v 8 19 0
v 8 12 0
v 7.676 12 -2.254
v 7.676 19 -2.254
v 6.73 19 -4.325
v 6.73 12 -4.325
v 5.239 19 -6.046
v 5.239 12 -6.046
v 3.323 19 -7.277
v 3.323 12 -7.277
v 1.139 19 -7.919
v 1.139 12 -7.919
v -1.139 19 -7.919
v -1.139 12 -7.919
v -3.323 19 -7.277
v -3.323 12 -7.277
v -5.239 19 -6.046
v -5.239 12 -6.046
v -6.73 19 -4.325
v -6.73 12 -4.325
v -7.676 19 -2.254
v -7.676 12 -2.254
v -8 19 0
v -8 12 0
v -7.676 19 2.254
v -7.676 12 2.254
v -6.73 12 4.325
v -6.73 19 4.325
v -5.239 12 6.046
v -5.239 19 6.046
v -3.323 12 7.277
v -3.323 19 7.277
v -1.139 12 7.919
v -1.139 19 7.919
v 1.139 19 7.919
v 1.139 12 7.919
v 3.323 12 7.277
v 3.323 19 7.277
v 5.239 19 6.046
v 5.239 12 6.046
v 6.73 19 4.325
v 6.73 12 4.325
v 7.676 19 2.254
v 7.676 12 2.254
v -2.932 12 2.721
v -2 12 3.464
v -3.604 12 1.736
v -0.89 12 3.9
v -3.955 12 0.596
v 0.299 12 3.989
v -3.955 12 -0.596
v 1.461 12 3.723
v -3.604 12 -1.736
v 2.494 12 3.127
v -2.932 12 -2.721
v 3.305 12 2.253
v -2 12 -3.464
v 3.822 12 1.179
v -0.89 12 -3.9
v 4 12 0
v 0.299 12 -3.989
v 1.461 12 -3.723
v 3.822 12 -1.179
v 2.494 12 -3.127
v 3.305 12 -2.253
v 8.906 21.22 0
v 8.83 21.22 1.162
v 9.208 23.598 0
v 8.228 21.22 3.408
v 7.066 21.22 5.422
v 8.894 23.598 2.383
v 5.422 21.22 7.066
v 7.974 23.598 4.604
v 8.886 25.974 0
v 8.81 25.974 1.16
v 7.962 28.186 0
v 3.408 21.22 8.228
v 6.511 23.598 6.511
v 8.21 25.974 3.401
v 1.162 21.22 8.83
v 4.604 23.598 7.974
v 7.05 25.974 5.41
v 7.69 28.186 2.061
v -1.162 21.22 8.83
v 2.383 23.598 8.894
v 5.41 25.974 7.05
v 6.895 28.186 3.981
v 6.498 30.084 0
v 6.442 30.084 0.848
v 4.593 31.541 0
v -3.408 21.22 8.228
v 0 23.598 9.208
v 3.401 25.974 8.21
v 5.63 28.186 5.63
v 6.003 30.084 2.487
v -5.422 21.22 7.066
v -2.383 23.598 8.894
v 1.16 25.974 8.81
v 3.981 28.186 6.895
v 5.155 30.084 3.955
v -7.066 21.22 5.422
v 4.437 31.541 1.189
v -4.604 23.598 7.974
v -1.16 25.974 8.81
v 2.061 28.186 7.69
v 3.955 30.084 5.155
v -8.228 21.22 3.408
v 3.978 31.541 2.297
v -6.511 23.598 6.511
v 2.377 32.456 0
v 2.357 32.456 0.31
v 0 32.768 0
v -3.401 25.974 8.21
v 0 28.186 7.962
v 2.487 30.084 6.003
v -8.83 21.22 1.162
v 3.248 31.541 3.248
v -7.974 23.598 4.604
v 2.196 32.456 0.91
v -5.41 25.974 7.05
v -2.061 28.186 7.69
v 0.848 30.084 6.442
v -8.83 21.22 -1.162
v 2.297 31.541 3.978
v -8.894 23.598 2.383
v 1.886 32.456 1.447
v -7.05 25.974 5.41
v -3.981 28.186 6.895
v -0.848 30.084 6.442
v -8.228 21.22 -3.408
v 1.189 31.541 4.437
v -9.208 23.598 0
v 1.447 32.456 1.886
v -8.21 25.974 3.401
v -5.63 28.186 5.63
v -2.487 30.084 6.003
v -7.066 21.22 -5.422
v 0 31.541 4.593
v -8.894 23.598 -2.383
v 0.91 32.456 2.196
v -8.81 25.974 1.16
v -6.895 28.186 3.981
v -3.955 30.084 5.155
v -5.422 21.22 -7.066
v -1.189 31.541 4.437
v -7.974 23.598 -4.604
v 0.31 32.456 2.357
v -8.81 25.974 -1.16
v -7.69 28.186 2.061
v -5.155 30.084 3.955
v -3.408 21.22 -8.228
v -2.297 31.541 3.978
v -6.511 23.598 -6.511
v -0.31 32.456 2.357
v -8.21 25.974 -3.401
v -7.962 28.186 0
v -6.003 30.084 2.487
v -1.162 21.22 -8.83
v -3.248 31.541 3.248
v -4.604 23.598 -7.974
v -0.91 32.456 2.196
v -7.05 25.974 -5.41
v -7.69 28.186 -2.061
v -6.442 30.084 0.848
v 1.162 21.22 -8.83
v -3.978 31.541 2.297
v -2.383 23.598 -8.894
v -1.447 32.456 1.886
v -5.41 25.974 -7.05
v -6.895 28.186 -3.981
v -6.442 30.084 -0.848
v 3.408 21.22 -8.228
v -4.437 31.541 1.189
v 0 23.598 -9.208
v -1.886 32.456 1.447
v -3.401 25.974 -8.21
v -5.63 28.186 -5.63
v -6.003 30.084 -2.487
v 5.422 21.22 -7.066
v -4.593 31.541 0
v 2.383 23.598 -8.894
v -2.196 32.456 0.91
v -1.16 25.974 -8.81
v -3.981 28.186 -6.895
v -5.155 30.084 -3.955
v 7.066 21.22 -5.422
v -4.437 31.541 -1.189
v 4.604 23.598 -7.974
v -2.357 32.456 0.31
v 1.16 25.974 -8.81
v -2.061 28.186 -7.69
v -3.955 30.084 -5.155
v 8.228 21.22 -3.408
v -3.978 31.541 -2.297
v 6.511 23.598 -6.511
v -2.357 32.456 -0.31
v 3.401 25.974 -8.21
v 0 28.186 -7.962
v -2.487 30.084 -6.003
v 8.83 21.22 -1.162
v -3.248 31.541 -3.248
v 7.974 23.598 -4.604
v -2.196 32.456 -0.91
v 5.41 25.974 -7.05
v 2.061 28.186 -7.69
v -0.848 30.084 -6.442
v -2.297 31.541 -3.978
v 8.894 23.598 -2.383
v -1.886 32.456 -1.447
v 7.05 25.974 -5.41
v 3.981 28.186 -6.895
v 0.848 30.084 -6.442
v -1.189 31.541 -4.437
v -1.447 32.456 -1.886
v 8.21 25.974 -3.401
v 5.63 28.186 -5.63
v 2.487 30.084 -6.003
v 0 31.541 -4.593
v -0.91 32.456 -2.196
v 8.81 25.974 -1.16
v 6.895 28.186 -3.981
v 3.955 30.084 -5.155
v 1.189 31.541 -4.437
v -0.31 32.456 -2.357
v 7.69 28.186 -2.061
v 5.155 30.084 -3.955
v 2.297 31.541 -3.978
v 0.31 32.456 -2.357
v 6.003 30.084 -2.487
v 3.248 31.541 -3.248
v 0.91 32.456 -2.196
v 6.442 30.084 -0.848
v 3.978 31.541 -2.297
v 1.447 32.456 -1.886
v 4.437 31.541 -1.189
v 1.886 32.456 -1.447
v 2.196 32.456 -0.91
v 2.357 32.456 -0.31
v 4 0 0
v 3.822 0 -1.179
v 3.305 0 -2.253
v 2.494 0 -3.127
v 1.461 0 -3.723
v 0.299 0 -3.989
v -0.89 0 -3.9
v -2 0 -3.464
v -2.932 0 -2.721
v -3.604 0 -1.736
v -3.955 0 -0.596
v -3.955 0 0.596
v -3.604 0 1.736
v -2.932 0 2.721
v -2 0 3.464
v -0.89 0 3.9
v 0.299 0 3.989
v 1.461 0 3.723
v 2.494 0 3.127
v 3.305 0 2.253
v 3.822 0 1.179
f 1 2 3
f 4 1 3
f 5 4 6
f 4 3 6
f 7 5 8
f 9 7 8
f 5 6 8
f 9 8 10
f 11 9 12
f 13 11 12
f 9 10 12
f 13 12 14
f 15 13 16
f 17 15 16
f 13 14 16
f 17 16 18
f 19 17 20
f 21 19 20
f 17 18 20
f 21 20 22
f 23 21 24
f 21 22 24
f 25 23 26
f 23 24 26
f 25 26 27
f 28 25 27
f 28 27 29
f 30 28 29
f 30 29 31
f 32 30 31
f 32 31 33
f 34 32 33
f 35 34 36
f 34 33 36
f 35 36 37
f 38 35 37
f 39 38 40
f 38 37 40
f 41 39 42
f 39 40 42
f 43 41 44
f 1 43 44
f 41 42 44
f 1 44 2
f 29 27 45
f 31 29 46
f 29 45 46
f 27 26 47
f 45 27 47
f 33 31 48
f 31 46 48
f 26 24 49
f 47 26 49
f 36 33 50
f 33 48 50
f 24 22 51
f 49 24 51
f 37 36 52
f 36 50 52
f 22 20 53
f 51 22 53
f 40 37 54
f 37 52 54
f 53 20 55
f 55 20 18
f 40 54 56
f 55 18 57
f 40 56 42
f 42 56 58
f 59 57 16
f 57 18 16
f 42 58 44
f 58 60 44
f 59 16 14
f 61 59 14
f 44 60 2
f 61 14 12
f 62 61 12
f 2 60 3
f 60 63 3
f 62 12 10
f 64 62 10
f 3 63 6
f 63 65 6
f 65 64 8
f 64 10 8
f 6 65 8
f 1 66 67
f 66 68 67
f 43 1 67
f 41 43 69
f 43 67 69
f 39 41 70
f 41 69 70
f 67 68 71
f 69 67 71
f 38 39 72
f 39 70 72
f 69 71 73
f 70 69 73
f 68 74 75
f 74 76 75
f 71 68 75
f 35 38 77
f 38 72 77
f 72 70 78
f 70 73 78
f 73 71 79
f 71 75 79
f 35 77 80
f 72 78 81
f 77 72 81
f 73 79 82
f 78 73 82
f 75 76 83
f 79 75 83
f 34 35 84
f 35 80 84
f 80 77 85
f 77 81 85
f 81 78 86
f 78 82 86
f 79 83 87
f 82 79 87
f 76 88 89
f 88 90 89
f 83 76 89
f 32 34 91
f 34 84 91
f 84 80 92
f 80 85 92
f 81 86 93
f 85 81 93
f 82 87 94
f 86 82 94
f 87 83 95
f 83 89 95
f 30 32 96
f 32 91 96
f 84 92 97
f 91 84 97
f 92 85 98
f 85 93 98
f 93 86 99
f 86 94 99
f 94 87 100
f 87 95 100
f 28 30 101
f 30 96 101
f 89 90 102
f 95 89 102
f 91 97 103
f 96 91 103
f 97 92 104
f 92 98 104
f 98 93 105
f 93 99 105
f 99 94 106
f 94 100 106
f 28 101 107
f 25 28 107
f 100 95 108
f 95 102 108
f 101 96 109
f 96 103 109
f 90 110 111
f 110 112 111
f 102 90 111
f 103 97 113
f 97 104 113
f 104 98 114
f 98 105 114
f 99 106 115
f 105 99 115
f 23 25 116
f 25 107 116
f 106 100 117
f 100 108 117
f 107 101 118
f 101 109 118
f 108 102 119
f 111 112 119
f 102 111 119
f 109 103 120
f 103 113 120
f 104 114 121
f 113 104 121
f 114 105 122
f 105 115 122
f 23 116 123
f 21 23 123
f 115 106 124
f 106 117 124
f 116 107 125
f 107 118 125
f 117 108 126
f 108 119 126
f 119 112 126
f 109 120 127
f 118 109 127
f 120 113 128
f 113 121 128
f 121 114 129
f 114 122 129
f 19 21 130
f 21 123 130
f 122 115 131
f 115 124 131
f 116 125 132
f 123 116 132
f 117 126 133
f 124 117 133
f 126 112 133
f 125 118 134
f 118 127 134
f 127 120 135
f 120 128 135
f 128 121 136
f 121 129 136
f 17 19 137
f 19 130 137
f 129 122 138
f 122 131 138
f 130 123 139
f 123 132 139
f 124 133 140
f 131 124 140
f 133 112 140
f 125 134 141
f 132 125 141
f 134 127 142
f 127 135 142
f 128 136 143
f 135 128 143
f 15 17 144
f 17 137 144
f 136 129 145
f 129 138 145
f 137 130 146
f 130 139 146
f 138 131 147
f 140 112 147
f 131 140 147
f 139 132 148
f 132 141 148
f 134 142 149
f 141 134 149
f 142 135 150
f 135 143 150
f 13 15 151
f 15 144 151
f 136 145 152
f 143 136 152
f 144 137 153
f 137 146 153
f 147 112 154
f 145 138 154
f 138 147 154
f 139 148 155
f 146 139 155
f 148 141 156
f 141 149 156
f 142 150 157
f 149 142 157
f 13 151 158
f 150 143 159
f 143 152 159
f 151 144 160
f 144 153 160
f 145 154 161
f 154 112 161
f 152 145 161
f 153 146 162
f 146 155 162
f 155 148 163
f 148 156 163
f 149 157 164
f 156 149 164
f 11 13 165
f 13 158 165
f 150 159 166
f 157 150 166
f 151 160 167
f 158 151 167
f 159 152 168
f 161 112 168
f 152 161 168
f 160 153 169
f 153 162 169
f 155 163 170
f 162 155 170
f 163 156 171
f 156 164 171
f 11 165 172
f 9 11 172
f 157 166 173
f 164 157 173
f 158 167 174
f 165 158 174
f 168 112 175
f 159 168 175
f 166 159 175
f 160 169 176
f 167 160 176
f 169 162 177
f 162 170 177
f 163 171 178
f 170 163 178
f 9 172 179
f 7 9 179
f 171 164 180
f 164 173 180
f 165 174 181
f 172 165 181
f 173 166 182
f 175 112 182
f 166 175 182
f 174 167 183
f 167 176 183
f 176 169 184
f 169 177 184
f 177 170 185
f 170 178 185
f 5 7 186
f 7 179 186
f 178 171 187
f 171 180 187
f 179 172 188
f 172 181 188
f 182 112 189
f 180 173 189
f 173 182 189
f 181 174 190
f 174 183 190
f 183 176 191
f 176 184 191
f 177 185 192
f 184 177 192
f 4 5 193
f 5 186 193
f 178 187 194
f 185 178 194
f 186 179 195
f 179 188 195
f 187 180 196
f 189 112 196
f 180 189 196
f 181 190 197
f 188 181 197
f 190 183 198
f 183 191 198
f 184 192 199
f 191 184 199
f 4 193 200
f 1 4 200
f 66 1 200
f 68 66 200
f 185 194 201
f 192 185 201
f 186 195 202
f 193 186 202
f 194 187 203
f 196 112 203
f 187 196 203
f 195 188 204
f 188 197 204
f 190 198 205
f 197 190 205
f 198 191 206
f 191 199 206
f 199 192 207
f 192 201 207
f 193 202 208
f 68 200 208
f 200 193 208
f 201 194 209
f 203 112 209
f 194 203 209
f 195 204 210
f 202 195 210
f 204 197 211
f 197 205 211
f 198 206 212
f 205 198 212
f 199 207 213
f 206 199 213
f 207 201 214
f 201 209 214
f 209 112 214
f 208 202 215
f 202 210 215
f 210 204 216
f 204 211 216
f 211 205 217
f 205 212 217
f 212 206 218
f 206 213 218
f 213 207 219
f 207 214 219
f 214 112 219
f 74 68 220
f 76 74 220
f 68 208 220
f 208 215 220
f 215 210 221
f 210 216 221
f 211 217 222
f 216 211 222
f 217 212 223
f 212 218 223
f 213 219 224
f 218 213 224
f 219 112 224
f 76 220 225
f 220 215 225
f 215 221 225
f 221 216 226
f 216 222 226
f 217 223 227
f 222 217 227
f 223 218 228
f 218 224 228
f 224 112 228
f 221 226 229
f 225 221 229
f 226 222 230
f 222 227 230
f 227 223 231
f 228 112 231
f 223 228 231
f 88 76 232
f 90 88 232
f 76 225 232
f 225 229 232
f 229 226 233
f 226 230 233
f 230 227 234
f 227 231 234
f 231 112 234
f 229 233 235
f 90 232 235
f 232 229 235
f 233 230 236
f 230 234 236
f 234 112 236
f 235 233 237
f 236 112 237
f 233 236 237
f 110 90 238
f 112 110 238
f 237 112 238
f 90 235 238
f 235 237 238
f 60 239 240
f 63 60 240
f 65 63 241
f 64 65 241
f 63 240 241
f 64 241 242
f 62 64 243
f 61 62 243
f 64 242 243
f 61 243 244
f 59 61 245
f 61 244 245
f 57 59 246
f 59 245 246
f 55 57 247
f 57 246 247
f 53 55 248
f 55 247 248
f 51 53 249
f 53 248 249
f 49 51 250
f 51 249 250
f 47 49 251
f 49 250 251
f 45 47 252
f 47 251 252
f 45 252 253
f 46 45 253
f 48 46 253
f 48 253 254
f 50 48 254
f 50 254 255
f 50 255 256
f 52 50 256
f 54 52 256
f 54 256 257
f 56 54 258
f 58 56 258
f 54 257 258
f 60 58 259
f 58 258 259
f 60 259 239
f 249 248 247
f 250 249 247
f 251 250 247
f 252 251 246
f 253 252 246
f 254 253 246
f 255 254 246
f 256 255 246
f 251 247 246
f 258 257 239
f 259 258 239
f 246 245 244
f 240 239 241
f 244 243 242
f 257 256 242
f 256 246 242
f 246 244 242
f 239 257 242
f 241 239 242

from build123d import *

# Parameters (mm, degrees)
SKETCH1_R           = 4
BOSS_EXTRUDE1_DEPTH = 12
SKETCH3_R           = 8
BOSS_EXTRUDE2_DEPTH = 7


with BuildPart() as part:
    # Sketch1 → Boss-Extrude1 (new body)
    with BuildSketch(Plane(origin=(0, 0, 0), x_dir=(1, 0, 0), z_dir=(0, 1, 0))):
        Circle(SKETCH1_R)
    extrude(amount=BOSS_EXTRUDE1_DEPTH)

    # Sketch3 → Boss-Extrude2 (add)
    with BuildSketch(Plane(origin=(0, 12, 0), x_dir=(1, 0, 0), z_dir=(0, 1, 0))):
        Circle(SKETCH3_R)
    extrude(amount=BOSS_EXTRUDE2_DEPTH)

    # Sketch4 → Revolve2 (revolve)
    with BuildSketch(Plane.XY):
        with BuildLine():
            Line((0, 28.11938617), (0, 19))
            Line((0, 19), (8, 19))
            ThreePointArc((8, 19), (7.961699903, 28.185937316), (0, 32.767885146))
            Line((0, 32.767885146), (0, 28.11938617))
        make_face()
    revolve(axis=Axis((0, 28.11938617, 0), (0, -1, 0)))


solid = part.part
